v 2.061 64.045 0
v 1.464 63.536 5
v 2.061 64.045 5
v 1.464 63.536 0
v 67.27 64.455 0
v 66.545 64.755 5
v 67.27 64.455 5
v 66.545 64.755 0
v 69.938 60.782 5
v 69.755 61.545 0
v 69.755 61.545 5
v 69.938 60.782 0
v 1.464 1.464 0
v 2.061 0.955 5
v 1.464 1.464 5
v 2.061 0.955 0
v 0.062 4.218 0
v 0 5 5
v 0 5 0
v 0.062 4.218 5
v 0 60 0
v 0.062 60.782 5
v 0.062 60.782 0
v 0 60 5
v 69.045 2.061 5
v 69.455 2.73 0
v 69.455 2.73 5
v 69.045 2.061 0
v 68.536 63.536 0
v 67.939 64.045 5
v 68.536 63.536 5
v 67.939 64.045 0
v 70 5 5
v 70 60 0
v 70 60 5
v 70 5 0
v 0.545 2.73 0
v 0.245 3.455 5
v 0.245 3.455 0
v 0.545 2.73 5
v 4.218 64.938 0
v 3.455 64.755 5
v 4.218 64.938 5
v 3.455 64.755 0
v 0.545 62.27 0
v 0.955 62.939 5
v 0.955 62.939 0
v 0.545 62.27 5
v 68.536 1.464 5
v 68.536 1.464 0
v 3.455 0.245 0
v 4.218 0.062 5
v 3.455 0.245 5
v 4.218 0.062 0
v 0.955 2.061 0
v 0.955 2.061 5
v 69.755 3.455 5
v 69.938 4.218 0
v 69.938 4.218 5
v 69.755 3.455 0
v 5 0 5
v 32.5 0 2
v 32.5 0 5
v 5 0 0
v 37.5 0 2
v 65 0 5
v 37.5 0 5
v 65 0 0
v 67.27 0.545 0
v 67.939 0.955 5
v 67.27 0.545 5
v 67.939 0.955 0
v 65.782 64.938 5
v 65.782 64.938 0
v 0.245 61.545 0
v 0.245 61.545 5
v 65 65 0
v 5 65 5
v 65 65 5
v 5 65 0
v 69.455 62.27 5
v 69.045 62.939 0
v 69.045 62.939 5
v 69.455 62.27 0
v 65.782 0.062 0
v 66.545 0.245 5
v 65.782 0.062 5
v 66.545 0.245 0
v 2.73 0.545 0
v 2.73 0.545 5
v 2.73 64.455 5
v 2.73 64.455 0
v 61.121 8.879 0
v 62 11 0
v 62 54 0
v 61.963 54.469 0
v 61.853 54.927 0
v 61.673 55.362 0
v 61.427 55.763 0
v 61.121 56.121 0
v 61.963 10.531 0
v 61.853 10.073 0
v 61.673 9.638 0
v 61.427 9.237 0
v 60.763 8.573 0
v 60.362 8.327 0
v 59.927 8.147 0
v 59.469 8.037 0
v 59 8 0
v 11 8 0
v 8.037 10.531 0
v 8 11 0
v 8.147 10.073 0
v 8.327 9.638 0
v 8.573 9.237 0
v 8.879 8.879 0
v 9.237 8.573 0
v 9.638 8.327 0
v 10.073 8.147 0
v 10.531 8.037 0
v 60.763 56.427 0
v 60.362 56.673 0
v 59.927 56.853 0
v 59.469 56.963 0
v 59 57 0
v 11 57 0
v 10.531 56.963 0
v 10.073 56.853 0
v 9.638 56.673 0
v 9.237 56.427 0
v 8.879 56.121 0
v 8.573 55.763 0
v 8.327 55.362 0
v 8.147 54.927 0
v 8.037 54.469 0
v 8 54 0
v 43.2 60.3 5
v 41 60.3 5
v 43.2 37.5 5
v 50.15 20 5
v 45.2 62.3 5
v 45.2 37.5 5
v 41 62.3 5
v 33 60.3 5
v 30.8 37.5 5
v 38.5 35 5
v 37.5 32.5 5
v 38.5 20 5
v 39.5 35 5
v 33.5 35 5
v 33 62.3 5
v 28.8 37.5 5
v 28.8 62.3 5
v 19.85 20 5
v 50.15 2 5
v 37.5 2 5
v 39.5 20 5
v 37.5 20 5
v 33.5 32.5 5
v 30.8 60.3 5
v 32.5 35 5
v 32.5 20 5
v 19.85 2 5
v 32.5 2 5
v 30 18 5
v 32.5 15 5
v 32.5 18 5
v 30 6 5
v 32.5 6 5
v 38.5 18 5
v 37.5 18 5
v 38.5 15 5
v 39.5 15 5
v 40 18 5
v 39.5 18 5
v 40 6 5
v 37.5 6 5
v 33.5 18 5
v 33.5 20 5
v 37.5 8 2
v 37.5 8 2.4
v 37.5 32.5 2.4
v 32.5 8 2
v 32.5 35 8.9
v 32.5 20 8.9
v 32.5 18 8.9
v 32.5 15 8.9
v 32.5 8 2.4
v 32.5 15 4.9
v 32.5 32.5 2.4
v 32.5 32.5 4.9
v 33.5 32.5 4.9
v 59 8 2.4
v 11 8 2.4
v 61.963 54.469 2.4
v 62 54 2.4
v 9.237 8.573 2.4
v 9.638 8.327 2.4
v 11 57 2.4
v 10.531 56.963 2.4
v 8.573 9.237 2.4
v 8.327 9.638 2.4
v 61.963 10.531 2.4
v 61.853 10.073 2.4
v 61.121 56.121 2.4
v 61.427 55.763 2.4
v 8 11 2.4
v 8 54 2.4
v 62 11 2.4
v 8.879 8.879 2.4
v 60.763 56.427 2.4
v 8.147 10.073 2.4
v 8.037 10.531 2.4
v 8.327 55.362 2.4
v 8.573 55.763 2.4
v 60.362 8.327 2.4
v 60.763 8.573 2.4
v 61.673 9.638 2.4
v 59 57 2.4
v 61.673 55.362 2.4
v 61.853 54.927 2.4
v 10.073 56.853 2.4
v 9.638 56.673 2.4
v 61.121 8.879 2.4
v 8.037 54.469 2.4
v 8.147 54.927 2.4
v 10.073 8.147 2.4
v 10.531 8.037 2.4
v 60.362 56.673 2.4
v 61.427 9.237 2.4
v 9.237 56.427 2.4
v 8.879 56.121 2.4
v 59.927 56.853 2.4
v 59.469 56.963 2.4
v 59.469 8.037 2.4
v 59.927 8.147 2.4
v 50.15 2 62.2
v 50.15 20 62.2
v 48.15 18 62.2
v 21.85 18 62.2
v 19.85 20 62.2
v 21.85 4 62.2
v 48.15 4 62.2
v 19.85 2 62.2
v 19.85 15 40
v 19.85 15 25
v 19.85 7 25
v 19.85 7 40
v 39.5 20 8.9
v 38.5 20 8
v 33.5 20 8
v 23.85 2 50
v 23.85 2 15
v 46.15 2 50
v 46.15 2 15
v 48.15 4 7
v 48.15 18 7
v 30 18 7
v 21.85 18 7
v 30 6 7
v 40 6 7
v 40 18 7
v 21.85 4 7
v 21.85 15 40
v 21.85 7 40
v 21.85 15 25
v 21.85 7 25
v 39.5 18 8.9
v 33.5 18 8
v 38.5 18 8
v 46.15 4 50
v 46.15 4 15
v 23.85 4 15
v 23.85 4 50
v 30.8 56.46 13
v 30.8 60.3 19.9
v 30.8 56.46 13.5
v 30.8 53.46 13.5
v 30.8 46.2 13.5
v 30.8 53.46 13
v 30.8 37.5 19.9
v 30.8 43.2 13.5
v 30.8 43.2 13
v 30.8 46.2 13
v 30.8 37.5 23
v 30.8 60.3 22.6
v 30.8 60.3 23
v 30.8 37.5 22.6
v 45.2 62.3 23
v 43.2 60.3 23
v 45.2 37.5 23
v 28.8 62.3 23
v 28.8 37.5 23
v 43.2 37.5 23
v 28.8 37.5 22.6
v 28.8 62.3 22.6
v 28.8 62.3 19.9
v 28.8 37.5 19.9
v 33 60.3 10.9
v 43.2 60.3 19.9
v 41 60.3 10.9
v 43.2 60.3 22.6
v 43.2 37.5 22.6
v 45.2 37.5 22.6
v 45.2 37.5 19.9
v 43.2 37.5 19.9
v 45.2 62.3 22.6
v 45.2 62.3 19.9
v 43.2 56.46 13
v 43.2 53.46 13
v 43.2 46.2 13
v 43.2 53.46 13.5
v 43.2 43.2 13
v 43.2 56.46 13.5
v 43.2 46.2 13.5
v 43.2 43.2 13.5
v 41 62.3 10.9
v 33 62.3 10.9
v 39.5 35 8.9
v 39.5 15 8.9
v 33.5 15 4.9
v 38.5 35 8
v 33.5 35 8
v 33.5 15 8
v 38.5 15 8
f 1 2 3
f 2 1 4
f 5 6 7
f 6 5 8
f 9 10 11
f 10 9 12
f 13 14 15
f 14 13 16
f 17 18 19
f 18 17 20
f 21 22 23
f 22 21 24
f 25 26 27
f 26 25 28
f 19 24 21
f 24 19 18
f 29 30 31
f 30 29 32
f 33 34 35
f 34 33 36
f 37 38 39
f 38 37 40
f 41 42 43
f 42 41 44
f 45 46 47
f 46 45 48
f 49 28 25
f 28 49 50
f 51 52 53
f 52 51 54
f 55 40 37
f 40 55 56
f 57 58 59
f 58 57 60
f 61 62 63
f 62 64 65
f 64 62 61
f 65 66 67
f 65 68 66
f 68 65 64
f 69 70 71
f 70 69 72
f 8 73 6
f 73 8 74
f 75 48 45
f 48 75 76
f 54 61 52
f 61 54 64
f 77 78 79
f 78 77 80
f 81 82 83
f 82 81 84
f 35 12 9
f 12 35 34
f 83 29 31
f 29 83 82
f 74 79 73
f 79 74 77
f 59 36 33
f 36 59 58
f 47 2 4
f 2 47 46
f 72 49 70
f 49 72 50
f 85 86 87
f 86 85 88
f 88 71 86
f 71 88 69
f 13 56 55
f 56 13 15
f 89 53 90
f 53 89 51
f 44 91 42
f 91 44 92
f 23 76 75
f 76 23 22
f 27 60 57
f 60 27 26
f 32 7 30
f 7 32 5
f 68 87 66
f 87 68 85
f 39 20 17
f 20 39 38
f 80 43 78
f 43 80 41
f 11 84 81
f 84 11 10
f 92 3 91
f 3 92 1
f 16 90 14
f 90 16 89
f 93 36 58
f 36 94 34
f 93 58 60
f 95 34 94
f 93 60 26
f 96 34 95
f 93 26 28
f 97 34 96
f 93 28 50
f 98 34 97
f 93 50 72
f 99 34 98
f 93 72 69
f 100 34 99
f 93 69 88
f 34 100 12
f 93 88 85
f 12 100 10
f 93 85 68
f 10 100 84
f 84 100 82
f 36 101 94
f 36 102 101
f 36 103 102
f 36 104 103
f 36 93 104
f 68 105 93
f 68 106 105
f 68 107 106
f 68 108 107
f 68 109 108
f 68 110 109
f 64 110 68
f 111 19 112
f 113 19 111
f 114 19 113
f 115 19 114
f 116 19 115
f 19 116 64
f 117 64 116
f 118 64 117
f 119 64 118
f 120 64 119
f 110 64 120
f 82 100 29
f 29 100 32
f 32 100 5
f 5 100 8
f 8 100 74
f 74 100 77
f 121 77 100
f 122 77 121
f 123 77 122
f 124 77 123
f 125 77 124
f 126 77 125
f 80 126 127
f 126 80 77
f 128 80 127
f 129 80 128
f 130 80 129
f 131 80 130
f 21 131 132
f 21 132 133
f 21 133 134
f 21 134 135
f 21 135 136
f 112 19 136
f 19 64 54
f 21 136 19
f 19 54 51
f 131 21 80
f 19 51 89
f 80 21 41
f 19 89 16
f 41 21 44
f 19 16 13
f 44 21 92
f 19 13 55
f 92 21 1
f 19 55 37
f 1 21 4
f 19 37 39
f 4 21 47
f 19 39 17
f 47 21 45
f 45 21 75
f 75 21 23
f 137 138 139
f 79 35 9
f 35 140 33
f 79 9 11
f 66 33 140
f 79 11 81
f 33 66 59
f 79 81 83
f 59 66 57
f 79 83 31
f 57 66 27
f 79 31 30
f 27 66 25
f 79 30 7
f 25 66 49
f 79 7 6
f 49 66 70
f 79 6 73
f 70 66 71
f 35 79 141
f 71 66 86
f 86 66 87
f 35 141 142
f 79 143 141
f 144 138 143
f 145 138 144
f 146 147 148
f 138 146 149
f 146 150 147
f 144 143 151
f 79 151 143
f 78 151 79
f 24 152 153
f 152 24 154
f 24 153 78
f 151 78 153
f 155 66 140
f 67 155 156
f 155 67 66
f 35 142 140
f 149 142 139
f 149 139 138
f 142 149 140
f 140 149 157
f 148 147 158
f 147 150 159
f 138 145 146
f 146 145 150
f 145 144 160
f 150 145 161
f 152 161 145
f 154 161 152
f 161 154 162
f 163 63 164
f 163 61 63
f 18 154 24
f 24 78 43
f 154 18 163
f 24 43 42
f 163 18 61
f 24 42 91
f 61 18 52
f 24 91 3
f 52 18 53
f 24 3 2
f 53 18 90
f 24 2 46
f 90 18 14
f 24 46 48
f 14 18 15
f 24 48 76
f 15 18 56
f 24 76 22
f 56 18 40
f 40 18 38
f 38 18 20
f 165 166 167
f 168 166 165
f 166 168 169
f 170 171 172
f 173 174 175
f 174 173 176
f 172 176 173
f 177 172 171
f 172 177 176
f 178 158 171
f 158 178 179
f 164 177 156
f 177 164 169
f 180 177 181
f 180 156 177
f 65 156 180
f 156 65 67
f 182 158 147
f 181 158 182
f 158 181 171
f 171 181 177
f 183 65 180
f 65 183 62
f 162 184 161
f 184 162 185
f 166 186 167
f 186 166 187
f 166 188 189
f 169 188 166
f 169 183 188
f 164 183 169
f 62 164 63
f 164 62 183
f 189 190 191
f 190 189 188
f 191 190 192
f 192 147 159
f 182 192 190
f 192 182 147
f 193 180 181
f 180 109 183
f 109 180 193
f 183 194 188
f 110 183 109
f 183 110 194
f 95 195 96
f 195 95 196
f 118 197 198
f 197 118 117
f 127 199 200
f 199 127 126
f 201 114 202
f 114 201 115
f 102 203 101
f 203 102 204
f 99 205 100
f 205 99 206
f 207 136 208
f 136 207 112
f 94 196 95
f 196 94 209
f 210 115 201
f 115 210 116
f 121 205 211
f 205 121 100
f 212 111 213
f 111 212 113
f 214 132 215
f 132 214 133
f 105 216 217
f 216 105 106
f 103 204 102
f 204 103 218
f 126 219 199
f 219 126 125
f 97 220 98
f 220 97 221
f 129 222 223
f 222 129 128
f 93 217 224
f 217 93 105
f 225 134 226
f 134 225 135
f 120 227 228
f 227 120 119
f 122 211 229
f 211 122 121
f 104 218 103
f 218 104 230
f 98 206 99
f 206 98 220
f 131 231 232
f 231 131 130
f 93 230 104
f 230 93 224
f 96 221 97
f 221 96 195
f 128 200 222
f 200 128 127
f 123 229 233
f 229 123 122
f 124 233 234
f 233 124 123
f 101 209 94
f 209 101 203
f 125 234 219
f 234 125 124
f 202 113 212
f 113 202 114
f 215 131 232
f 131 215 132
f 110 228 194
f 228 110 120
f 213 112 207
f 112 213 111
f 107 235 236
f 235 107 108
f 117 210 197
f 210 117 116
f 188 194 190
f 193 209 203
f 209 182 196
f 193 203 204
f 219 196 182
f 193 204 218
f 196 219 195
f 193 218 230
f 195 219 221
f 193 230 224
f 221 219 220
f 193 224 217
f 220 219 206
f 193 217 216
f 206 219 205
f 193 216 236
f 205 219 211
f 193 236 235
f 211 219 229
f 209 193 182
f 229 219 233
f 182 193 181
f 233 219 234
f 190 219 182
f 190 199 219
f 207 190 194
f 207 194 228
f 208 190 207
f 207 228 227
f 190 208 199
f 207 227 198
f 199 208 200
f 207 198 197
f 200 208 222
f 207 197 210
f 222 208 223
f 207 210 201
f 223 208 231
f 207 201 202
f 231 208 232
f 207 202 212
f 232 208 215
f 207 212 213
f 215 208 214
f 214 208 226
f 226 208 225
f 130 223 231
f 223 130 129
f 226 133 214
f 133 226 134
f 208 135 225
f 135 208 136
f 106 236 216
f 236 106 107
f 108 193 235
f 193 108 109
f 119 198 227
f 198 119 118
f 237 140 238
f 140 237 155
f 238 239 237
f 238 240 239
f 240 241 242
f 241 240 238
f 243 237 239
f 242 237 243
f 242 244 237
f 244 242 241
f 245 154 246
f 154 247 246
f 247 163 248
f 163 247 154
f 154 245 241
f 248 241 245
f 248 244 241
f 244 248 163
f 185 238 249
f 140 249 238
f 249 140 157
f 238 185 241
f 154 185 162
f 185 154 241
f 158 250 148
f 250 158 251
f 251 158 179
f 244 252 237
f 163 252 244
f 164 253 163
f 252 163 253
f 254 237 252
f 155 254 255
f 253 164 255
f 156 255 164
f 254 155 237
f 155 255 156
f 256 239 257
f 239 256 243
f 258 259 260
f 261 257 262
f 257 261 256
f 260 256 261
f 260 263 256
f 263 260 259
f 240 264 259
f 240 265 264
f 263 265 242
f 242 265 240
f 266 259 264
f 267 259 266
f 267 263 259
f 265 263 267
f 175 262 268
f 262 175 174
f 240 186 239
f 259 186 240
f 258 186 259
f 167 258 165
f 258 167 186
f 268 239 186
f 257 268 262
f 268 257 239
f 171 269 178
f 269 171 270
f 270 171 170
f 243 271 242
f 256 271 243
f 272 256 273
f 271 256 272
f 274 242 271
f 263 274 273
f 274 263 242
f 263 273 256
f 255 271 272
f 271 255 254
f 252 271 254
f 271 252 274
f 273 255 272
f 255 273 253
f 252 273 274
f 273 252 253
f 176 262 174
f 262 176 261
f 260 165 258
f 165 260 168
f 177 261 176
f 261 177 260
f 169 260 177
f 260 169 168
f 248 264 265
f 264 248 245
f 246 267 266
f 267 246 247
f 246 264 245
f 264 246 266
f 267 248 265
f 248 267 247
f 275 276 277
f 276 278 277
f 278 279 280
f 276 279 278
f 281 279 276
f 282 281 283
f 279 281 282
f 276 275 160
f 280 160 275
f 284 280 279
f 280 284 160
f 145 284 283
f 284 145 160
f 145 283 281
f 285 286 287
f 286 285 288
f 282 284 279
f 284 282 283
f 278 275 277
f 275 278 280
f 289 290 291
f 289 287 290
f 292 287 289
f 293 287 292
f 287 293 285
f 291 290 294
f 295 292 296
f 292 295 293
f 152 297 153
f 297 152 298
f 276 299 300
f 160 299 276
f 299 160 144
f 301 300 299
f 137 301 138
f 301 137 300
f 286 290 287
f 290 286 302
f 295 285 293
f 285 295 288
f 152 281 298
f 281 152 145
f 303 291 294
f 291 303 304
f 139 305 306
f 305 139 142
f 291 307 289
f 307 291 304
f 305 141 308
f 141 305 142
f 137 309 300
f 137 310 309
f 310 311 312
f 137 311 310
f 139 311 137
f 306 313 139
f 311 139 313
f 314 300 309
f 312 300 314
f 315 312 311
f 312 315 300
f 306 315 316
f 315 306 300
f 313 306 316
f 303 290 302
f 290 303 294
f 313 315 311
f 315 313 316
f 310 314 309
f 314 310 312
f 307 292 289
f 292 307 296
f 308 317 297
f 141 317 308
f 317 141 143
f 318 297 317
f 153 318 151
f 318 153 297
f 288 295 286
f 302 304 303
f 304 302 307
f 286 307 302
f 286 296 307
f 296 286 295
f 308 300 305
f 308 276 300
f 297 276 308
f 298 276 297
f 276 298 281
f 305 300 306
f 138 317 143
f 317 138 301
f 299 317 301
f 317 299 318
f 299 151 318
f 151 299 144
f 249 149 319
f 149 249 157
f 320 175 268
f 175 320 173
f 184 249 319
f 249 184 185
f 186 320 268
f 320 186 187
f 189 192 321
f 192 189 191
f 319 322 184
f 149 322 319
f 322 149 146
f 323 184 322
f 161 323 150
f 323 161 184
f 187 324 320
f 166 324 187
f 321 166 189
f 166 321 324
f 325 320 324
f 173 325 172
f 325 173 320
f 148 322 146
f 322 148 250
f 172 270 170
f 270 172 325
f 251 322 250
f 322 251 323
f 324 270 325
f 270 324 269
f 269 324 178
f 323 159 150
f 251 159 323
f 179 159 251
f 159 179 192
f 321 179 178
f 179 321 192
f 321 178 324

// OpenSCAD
// Clawbie V3 — Base with M5StickC Plus2 slot & SG90 servo mount
// All dimensions in mm. Parametric design, no support needed for printing.

/* ── Parameters ─────────────────────────────────────────── */

// M5StickC Plus2 body (insert vertically, screen forward)
m5_w  = 25.5;   // width (X)
m5_d  = 13.2;   // depth (Y)
m5_h  = 54.2;   // height (Z)
m5_tol = 0.4;   // tolerance per side

// SG90 micro servo
sv_w  = 11.8;   // body width (X)
sv_d  = 22.2;   // body depth (Y)
sv_h  = 31.0;   // body height incl. shaft (Z)
sv_ear_span = 27.6; // mounting ear center-to-center
sv_ear_h    = 2.5;  // ear thickness
sv_ear_w    = 4.8;  // ear width (each side beyond body)
sv_shaft_offset = 6.0; // shaft center from top of body

// Base plate
base_w = 70;     // width (X)
base_d = 65;     // depth (Y)
base_h = 5;      // plate thickness
corner_r = 5;    // fillet radius

// M5 slot
slot_wall = 2.0;

// Cable channel
cable_w = 5;
cable_d = 3;

// Servo mount position (centered X, behind M5)
sv_mount_z = base_h; // servo sits on top of base

$fn = 40;

/* ── Modules ────────────────────────────────────────────── */

module rounded_box(w, d, h, r) {
    hull() {
        for (x = [r, w-r], y = [r, d-r])
            translate([x, y, 0])
                cylinder(r=r, h=h);
    }
}

module base_plate() {
    difference() {
        rounded_box(base_w, base_d, base_h, corner_r);

        // Cable channel from servo area to back
        translate([base_w/2 - cable_w/2, 0, base_h - cable_d])
            cube([cable_w, base_d/2, cable_d + 0.1]);

        // Weight-saving pocket (bottom)
        translate([8, 8, -0.1])
            rounded_box(base_w - 16, base_d - 16, 2.5, 3);
    }
}

module m5_slot() {
    // Vertical slot for M5StickC Plus2, screen facing -Y (front)
    sw = m5_w + m5_tol * 2;
    sd = m5_d + m5_tol * 2;
    wall = slot_wall;

    translate([base_w/2 - (sw + wall*2)/2, 2, base_h]) {
        difference() {
            // Outer shell
            cube([sw + wall*2, sd + wall*2, m5_h + 3]);

            // Inner cavity (open top for insertion)
            translate([wall, wall, 2])
                cube([sw, sd, m5_h + 5]);

            // Screen window (front face, -Y side)
            translate([wall + 2, -0.1, 10])
                cube([sw - 4, wall + 0.2, 35]);

            // USB-C port access (bottom)
            translate([wall + (sw - 10)/2, wall + 2, -0.1])
                cube([10, sd - 2, 2.5]);

            // Button access holes (side)
            translate([-0.1, wall + sd/2 - 4, 20])
                cube([wall + 0.2, 8, 15]);
        }
    }
}

module servo_mount() {
    // SG90 sits behind the M5 slot, shaft pointing up
    // Snap-fit cradle — no screws needed
    tol = 0.3;
    bw = sv_w + tol*2;
    bd = sv_d + tol*2;
    cradle_h = 18; // partial wrap around servo body

    sx = base_w/2 - bw/2;
    sy = base_d/2 + 5;

    translate([sx, sy, base_h]) {
        difference() {
            // Cradle walls
            union() {
                // Left wall
                cube([2, bd, cradle_h]);
                // Right wall
                translate([bw + 2, 0, 0])
                    cube([2, bd, cradle_h]);
                // Back wall
                translate([0, bd, 0])
                    cube([bw + 4, 2, cradle_h]);
                // Ear ledge (supports mounting ears)
                translate([0, 0, cradle_h - sv_ear_h - 0.5])
                    cube([bw + 4, bd + 2, sv_ear_h + 0.5]);
            }

            // Servo body cavity
            translate([2, 0, 0])
                cube([bw, bd, cradle_h + 1]);

            // Ear slot (let ears sit in the ledge)
            ear_extra = sv_ear_w + tol;
            translate([2 - ear_extra, (bd - sv_ear_span)/2, cradle_h - sv_ear_h - 0.5 - 0.1])
                cube([bw + ear_extra*2, sv_ear_span + 2, sv_ear_h + 0.2]);

            // Wire exit (bottom back)
            translate([2 + bw/2 - 4, bd - 0.1, -0.1])
                cube([8, 3, 6]);
        }

        // Snap clips (2 per side, flex inward)
        for (side = [0, bw + 2], y_off = [bd*0.25, bd*0.7]) {
            translate([side, y_off, 0])
                snap_clip();
        }
    }
}

module snap_clip() {
    // Small triangular snap tab
    translate([0, 0, 8]) {
        hull() {
            cube([2, 3, 0.5]);
            translate([0.8, 0.5, -2])
                cube([0.4, 2, 2]);
        }
    }
}

module cable_channel_top() {
    // Guided channel on base surface from servo to M5
    translate([base_w/2 - cable_w/2, 15, base_h - 0.1]) {
        difference() {
            cube([cable_w + 2, 20, cable_d + 1]);
            translate([1, -0.1, -0.1])
                cube([cable_w, 20.2, cable_d + 0.2]);
        }
    }
}

/* ── Assembly ───────────────────────────────────────────── */

module clawbie_v3_base() {
    color("LightCoral") base_plate();
    color("Salmon") m5_slot();
    color("IndianRed") servo_mount();
    color("LightCoral") cable_channel_top();
}

clawbie_v3_base();

// Show M5 ghost for reference (comment out for printing)
%translate([base_w/2 - m5_w/2, 2 + slot_wall + m5_tol,
            base_h + 2])
    color("DarkGray", 0.3) cube([m5_w, m5_d, m5_h]);
